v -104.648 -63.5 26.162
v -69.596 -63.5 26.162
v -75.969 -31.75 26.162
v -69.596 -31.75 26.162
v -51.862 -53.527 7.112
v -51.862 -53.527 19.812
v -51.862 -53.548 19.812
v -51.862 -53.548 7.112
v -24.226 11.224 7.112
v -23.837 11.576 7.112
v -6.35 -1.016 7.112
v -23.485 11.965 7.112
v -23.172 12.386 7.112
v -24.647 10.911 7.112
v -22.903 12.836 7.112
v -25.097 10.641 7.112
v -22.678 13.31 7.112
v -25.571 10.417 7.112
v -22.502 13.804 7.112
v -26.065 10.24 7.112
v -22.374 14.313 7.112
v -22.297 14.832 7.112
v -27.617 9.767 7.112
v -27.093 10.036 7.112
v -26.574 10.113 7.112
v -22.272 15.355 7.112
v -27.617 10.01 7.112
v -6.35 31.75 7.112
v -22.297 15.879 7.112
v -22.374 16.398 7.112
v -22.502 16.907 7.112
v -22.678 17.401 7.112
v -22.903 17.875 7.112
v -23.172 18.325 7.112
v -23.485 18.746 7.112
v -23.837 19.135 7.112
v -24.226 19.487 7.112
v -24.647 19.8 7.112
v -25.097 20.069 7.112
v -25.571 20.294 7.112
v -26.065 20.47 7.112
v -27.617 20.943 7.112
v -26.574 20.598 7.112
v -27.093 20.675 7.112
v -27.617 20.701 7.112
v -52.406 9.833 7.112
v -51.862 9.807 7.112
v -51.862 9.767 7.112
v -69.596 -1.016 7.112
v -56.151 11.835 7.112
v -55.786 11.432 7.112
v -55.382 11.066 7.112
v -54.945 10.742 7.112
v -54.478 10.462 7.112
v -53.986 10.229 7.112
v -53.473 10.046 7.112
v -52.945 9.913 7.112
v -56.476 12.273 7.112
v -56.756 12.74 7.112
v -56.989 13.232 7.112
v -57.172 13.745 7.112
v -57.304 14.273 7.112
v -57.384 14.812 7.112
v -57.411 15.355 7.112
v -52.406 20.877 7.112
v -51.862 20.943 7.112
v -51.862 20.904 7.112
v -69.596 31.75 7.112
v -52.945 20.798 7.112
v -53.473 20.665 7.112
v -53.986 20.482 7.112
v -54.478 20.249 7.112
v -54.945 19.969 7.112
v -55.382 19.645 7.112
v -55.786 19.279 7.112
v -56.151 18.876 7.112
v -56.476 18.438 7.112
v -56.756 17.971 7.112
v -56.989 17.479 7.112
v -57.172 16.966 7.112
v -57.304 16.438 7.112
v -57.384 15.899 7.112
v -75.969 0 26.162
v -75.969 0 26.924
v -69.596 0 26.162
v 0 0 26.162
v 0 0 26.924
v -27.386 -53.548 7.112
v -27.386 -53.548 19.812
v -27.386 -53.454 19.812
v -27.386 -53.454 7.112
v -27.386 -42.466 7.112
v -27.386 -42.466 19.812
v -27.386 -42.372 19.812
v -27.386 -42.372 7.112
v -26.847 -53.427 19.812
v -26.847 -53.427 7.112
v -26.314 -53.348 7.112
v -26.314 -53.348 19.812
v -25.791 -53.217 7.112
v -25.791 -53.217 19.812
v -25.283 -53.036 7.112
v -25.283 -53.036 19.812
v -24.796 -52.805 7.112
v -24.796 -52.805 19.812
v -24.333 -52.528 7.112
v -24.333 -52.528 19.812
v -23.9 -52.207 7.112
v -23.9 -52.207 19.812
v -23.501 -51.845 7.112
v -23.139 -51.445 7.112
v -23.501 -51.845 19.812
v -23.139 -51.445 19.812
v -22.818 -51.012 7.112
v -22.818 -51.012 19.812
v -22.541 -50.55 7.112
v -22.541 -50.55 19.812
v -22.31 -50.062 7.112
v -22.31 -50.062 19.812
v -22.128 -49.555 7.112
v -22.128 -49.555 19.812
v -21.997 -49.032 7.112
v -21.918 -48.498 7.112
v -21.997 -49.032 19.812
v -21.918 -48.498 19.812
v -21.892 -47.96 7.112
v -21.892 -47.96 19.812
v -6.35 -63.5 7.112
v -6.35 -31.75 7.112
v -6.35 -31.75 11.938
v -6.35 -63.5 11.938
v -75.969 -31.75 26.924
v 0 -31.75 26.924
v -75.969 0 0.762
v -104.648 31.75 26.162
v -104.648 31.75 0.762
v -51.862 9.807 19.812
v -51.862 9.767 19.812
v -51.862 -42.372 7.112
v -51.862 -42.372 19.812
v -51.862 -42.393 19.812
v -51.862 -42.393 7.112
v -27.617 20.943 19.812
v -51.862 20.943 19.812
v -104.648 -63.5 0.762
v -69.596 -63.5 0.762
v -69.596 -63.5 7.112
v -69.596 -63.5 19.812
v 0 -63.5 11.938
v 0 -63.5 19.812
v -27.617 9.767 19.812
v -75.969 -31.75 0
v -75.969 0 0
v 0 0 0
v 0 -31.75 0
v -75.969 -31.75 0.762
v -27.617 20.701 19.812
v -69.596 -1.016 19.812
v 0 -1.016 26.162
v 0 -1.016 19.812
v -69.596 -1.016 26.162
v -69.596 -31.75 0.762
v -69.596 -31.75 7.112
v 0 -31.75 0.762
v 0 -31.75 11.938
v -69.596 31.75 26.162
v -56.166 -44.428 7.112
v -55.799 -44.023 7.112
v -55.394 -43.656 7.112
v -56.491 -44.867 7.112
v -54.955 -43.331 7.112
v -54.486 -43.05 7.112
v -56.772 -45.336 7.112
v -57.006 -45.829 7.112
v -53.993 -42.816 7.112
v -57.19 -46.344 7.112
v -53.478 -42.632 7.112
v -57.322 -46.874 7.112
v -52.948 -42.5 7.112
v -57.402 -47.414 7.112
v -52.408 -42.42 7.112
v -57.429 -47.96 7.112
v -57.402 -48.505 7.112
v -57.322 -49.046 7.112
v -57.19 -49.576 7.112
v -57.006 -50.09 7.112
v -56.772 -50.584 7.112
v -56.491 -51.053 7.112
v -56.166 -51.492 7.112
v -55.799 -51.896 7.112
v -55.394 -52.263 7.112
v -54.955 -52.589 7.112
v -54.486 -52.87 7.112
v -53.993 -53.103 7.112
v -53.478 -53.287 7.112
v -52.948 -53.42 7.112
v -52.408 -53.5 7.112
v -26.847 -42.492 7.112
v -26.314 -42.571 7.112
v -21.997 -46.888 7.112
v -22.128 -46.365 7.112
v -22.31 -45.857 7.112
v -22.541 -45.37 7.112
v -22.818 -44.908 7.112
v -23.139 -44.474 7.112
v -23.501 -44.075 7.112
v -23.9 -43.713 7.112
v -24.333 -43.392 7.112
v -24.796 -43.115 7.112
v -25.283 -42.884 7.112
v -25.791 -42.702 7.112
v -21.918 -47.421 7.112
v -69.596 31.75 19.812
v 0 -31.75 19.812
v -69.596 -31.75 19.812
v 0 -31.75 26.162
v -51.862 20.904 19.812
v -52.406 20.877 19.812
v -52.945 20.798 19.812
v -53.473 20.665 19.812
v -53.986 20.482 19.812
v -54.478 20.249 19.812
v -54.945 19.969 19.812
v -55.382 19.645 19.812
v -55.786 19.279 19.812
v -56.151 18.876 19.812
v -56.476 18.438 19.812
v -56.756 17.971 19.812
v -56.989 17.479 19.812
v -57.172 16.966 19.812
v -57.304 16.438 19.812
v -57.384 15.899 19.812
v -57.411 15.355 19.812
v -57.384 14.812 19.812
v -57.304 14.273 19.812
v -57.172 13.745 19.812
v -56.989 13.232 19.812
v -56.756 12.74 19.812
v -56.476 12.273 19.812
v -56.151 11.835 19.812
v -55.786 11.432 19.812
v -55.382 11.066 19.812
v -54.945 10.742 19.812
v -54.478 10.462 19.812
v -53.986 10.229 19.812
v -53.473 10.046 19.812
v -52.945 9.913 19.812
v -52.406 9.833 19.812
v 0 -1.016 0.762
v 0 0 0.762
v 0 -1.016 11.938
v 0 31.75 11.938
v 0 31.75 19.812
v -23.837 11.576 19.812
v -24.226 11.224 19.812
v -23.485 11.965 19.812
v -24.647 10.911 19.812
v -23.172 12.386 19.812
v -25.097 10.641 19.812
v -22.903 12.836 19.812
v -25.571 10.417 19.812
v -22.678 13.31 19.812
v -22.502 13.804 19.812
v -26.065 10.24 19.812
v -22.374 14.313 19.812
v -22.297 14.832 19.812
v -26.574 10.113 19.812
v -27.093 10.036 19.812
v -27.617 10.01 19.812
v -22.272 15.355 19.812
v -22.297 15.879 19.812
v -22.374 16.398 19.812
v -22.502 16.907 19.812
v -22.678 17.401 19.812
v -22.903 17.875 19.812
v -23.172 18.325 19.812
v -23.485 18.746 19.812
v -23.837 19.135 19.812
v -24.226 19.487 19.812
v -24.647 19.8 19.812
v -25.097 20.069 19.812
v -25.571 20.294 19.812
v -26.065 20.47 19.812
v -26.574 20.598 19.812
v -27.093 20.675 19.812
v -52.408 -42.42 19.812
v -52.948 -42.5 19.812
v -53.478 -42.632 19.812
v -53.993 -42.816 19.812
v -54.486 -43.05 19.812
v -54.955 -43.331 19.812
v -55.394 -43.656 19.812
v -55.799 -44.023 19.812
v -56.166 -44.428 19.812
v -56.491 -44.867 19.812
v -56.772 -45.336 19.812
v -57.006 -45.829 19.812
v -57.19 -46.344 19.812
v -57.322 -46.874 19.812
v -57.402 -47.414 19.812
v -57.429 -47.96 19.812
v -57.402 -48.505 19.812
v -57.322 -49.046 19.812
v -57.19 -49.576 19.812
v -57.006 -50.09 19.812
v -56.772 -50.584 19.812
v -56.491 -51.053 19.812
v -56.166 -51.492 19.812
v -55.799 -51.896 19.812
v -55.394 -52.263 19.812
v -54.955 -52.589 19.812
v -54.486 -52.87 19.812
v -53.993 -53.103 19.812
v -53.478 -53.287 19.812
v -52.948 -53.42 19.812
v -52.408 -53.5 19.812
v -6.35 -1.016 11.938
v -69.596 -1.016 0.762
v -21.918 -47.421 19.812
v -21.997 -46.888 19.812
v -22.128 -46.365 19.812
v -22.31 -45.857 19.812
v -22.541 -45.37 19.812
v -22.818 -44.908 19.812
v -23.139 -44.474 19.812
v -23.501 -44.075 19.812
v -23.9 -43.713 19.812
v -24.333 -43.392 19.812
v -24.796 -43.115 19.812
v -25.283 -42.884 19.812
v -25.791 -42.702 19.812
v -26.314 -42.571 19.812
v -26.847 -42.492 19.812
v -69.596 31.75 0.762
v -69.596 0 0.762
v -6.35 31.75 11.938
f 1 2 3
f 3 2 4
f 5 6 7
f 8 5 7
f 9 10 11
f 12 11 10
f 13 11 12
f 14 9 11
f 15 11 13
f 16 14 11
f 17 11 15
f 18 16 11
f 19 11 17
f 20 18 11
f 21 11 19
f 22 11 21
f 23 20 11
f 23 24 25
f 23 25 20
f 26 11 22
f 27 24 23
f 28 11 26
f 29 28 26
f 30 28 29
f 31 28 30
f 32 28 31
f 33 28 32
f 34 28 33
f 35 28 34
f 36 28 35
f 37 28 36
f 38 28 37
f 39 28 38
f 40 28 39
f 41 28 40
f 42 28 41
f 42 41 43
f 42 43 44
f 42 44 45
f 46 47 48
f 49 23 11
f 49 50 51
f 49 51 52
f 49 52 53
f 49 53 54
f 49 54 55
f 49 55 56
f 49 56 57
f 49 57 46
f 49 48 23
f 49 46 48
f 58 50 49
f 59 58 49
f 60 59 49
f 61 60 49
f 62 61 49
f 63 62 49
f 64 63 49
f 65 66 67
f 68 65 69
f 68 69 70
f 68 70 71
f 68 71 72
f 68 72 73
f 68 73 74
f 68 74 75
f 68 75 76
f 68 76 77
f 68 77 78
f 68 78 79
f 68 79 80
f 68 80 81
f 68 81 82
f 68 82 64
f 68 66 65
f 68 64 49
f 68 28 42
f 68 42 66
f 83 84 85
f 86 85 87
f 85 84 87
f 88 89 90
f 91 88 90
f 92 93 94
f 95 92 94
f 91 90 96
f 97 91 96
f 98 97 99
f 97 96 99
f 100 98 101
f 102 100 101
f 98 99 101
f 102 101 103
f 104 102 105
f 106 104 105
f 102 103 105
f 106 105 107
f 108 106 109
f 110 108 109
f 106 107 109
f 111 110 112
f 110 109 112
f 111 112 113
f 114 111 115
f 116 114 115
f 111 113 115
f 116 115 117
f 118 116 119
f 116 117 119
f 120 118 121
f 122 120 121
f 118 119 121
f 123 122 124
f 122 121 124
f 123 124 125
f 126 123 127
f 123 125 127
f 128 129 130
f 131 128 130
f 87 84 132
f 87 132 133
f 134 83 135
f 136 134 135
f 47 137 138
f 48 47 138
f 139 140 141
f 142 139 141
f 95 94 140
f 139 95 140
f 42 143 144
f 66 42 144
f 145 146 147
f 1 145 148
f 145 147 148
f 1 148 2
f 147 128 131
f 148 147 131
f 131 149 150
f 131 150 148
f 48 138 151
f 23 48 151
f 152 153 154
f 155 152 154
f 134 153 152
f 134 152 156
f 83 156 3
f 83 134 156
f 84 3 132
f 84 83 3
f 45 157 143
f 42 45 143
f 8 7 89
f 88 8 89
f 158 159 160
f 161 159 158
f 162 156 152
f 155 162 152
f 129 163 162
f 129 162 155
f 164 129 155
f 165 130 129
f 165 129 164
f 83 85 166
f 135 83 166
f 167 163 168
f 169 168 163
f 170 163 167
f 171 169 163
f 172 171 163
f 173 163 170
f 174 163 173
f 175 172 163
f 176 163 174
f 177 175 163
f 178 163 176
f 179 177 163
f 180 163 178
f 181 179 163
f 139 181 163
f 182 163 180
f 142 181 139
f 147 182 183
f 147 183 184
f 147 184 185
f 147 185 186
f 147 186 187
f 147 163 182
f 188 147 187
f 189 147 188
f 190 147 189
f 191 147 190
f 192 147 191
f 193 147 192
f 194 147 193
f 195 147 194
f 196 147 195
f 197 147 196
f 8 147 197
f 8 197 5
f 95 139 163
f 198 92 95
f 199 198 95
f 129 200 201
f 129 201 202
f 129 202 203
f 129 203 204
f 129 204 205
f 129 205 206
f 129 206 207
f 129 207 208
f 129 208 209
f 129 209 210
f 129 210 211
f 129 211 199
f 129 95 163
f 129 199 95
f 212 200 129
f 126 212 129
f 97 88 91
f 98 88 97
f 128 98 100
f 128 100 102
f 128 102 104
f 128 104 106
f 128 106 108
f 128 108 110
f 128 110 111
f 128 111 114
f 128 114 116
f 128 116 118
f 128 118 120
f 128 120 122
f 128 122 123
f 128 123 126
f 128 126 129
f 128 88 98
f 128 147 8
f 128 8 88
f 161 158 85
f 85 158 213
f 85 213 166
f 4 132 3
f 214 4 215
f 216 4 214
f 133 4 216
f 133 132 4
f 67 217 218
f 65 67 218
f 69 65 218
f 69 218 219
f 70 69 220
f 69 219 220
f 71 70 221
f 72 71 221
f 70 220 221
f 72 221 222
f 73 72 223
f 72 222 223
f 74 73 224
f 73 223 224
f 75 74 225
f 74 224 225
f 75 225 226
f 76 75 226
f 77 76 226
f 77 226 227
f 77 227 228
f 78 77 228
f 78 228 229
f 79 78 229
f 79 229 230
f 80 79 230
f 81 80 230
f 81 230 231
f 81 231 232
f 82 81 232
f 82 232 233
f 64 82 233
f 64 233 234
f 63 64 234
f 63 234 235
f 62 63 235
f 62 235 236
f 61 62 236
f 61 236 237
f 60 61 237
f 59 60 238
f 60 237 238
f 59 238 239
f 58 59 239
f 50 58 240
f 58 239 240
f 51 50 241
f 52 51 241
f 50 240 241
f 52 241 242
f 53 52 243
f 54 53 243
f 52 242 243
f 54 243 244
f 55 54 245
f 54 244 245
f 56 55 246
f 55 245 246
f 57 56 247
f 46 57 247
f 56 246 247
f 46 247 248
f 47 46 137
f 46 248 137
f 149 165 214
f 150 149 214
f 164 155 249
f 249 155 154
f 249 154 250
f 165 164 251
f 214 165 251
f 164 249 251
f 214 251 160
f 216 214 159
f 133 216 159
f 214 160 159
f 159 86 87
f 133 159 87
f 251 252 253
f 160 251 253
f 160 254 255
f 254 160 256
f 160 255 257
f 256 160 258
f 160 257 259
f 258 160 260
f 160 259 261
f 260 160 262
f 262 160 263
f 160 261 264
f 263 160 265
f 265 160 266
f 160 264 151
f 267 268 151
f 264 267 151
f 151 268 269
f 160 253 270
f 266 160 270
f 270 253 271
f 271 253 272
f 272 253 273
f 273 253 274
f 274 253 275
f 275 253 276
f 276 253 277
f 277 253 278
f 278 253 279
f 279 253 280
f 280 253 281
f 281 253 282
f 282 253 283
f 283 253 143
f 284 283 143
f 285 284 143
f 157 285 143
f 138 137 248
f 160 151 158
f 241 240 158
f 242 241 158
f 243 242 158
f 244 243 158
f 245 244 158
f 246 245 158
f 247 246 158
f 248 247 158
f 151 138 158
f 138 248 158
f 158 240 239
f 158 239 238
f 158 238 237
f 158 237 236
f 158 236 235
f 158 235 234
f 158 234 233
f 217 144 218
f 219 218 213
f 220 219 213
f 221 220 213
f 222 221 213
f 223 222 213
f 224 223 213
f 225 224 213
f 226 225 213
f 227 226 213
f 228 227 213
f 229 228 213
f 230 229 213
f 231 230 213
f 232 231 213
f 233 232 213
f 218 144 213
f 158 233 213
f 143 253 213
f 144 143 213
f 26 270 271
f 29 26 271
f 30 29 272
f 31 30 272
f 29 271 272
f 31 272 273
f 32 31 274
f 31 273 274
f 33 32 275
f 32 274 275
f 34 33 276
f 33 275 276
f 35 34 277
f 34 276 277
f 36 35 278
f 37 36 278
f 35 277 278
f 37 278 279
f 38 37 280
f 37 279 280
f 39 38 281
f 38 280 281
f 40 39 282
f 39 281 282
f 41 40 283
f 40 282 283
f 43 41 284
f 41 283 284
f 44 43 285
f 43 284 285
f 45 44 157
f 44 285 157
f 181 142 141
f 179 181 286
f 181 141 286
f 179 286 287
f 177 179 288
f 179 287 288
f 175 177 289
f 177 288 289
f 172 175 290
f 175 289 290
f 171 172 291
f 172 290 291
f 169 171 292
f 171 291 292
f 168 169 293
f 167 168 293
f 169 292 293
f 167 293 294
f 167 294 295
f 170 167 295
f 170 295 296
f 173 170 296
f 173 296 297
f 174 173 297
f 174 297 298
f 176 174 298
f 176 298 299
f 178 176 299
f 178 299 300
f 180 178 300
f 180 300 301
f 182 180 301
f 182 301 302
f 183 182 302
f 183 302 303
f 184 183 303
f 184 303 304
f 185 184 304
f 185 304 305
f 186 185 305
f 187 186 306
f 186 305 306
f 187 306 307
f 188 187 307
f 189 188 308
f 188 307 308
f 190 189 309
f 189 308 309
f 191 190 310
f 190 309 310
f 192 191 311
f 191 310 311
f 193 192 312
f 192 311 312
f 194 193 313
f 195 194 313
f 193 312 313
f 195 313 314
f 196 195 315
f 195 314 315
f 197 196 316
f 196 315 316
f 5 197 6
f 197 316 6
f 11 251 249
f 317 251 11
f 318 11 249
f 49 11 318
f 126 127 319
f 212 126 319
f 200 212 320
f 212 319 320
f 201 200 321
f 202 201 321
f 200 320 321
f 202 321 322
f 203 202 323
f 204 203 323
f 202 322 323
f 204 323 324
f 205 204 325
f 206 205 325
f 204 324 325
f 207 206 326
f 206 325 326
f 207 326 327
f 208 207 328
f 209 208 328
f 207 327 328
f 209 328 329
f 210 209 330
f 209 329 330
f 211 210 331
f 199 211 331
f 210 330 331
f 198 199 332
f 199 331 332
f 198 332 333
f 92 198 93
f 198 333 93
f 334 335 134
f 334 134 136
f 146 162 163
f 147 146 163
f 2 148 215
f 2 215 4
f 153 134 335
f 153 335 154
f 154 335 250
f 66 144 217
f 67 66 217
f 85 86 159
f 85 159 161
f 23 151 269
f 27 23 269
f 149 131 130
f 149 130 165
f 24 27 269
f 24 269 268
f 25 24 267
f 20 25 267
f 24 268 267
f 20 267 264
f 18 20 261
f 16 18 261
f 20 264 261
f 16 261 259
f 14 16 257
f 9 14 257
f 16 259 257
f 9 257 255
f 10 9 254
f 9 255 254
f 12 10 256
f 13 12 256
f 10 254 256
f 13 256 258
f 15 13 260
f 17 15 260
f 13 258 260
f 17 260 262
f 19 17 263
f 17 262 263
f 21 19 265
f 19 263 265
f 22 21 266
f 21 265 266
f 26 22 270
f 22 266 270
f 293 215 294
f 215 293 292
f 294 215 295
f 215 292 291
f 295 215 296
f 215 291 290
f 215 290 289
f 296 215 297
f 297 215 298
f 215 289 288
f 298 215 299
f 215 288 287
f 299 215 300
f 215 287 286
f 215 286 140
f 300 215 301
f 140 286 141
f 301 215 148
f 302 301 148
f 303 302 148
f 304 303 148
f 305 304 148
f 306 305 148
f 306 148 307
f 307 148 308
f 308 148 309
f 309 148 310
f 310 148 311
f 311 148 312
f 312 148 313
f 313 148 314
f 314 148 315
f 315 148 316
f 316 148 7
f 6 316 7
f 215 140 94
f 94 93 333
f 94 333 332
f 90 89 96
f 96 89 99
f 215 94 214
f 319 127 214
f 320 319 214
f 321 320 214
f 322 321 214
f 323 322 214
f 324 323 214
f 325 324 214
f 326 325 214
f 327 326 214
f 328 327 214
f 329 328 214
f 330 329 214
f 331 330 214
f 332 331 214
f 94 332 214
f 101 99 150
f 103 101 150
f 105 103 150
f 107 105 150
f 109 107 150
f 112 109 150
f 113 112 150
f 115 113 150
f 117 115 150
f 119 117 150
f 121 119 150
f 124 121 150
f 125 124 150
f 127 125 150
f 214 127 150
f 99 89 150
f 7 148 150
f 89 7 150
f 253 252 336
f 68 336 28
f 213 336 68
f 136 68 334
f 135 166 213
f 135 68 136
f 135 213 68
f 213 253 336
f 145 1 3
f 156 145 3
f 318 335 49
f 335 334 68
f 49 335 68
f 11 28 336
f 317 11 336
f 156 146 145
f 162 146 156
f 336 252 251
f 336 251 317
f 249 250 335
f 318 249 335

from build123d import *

# Parameters (mm, degrees)
F0_W      = 75.9690925479
F0_H      = 26.924
F1_DEPTH  = 31.75
F2_W      = 31.75
F2_H      = 25.4
F3_DEPTH  = 104.648
F4_W      = 69.596
F4_H      = 6.35
F5_DEPTH  = 32.766
F6_W      = 6.35
F6_H      = 4.826
F7_DEPTH  = 31.75
F8_DEPTH  = 31.75
F9_DEPTH  = 32.004
F10_DEPTH = 32.766
F11_DEPTH = 32.766
F12_W     = 69.596
F12_H     = 6.35
F13_DEPTH = 31.75
F14_W     = 6.35
F14_H     = 4.826
F15_DEPTH = 31.75
F17_DEPTH = 19.813
F19_DEPTH = 19.813
F21_DEPTH = 26.163
F23_DEPTH = 26.163


with BuildPart() as f1:
    # F0 (on Front) → F1 (new body)
    with BuildSketch(Plane.XZ):
        with Locations((-37.9845462739, 13.462)):
            Rectangle(F0_W, F0_H)
    extrude(amount=F1_DEPTH)

    # F2 (on face) → F3 (join)
    with BuildSketch(Plane.YZ):
        with Locations((-47.625, 13.462)):
            Rectangle(F2_W, F2_H)
        with Locations((15.875, 13.462)):
            Rectangle(F2_W, F2_H)
    extrude(amount=-F3_DEPTH)

    # F4 (on face) → F5 (cut)
    with BuildSketch(Plane(origin=(0, 31.75, 0), x_dir=(-1, 0, 0), z_dir=(0, 1, 0))):
        with Locations((34.798, 22.987)):
            Rectangle(F4_W, F4_H)
        with Locations((34.798, 3.937)):
            Rectangle(F4_W, F4_H)
    extrude(amount=-F5_DEPTH, mode=Mode.SUBTRACT)

    # F6 (on face) → F7 (join)
    with BuildSketch(Plane(origin=(0, 31.75, 0), x_dir=(-1, 0, 0), z_dir=(0, 1, 0))):
        with Locations((3.175, 9.525)):
            Rectangle(F6_W, F6_H)
    extrude(amount=-F7_DEPTH)

    # F6 (on face) → F8 (join)
    with BuildSketch(Plane(origin=(0, 31.75, 0), x_dir=(-1, 0, 0), z_dir=(0, 1, 0))):
        with Locations((3.175, 9.525)):
            Rectangle(F6_W, F6_H)
    extrude(amount=-F8_DEPTH)

    # F6 (on face) → F9 (cut)
    with BuildSketch(Plane(origin=(0, 31.75, 0), x_dir=(-1, 0, 0), z_dir=(0, 1, 0))):
        with Locations((3.175, 9.525)):
            Rectangle(F6_W, F6_H)
    extrude(amount=-F9_DEPTH, mode=Mode.SUBTRACT)

    # F6 (on face) → F10 (join)
    with BuildSketch(Plane(origin=(0, 31.75, 0), x_dir=(-1, 0, 0), z_dir=(0, 1, 0))):
        with Locations((3.175, 9.525)):
            Rectangle(F6_W, F6_H)
    extrude(amount=-F10_DEPTH)

    # F6 (on face) → F11 (cut)
    with BuildSketch(Plane(origin=(0, 31.75, 0), x_dir=(-1, 0, 0), z_dir=(0, 1, 0))):
        with Locations((3.175, 9.525)):
            Rectangle(F6_W, F6_H)
    extrude(amount=-F11_DEPTH, mode=Mode.SUBTRACT)

    # F12 (on face) → F13 (cut)
    with BuildSketch(Plane.XZ.offset(63.5)):
        with Locations((-34.798, 3.937)):
            Rectangle(F12_W, F12_H)
        with Locations((-34.798, 22.987)):
            Rectangle(F12_W, F12_H)
    extrude(amount=-F13_DEPTH, mode=Mode.SUBTRACT)

    # F14 (on face) → F15 (cut)
    with BuildSketch(Plane.XZ.offset(63.5)):
        with Locations((-3.175, 9.525)):
            Rectangle(F14_W, F14_H)
    extrude(amount=-F15_DEPTH, mode=Mode.SUBTRACT)

    # F16 (on face) → F17 (cut, through all)
    with BuildSketch(Plane.XY.offset(19.812)):
        with BuildLine():
            Line((-51.8621839583, 20.9041976536), (-51.8621839583, 9.8067118621))
            ThreePointArc((-51.8621839583, 9.8067118621), (-47.9386302296, 11.4319010292), (-46.3134410625, 15.3554547578))
            ThreePointArc((-46.3134410625, 15.3554547578), (-47.9386302296, 19.2790084865), (-51.8621839583, 20.9041976536))
        make_face()
        with BuildLine():
            ThreePointArc((-51.8621839583, 20.9041976536), (-57.410926854, 15.3554547578), (-51.8621839583, 9.8067118621))
            Line((-51.8621839583, 9.8067118621), (-51.8621839583, 20.9041976536))
        make_face()
        with BuildLine():
            Line((-51.8621839583, 9.7674547578), (-27.6167299598, 9.7674547578))
            Line((-27.6167299598, 9.7674547578), (-27.6167299598, 10.0103156582))
            ThreePointArc((-27.6167299598, 10.0103156582), (-32.9618690595, 15.3554547578), (-27.6167299598, 20.7005938574))
            Line((-27.6167299598, 20.7005938574), (-27.6167299598, 20.9434547578))
            Line((-27.6167299598, 20.9434547578), (-51.8621839583, 20.9434547578))
            Line((-51.8621839583, 20.9434547578), (-51.8621839583, 20.9041976536))
            ThreePointArc((-51.8621839583, 20.9041976536), (-47.9386302296, 19.2790084865), (-46.3134410625, 15.3554547578))
            ThreePointArc((-46.3134410625, 15.3554547578), (-47.9386302296, 11.4319010292), (-51.8621839583, 9.8067118621))
            Line((-51.8621839583, 9.8067118621), (-51.8621839583, 9.7674547578))
        make_face()
        with BuildLine():
            ThreePointArc((-27.6167299598, 20.7005938574), (-32.9618690595, 15.3554547578), (-27.6167299598, 10.0103156582))
            Line((-27.6167299598, 10.0103156582), (-27.6167299598, 20.7005938574))
        make_face()
        with BuildLine():
            Line((-27.6167299598, 20.7005938574), (-27.6167299598, 10.0103156582))
            ThreePointArc((-27.6167299598, 10.0103156582), (-23.8371458561, 11.5758706541), (-22.2715908602, 15.3554547578))
            ThreePointArc((-22.2715908602, 15.3554547578), (-23.8371458561, 19.1350388615), (-27.6167299598, 20.7005938574))
        make_face()
    extrude(amount=-F17_DEPTH, mode=Mode.SUBTRACT)

    # F18 (on face) → F19 (cut, through all)
    with BuildSketch(Plane.XY.offset(19.812)):
        with BuildLine():
            Line((-51.8621839583, -53.5478262464), (-27.3858178407, -53.5478262464))
            Line((-27.3858178407, -53.5478262464), (-27.3858178407, -53.4538679724))
            ThreePointArc((-27.3858178407, -53.4538679724), (-32.8798595667, -47.9598262464), (-27.3858178407, -42.4657845204))
            Line((-27.3858178407, -42.4657845204), (-27.3858178407, -42.3718262464))
            Line((-27.3858178407, -42.3718262464), (-51.8621839583, -42.3718262464))
            Line((-51.8621839583, -42.3718262464), (-51.8621839583, -42.3927269235))
            ThreePointArc((-51.8621839583, -42.3927269235), (-47.9256502755, -44.0232925636), (-46.2950846354, -47.9598262464))
            ThreePointArc((-46.2950846354, -47.9598262464), (-47.9256502755, -51.8963599291), (-51.8621839583, -53.5269255693))
            Line((-51.8621839583, -53.5269255693), (-51.8621839583, -53.5478262464))
        make_face()
        with BuildLine():
            ThreePointArc((-27.3858178407, -42.4657845204), (-32.8798595667, -47.9598262464), (-27.3858178407, -53.4538679724))
            Line((-27.3858178407, -53.4538679724), (-27.3858178407, -42.4657845204))
        make_face()
        with BuildLine():
            Line((-27.3858178407, -42.4657845204), (-27.3858178407, -53.4538679724))
            ThreePointArc((-27.3858178407, -53.4538679724), (-23.5009436801, -51.844700407), (-21.8917761147, -47.9598262464))
            ThreePointArc((-21.8917761147, -47.9598262464), (-23.5009436801, -44.0749520858), (-27.3858178407, -42.4657845204))
        make_face()
        with BuildLine():
            ThreePointArc((-51.8621839583, -42.3927269235), (-57.4292832812, -47.9598262464), (-51.8621839583, -53.5269255693))
            Line((-51.8621839583, -53.5269255693), (-51.8621839583, -42.3927269235))
        make_face()
        with BuildLine():
            Line((-51.8621839583, -42.3927269235), (-51.8621839583, -53.5269255693))
            ThreePointArc((-51.8621839583, -53.5269255693), (-47.9256502755, -51.8963599291), (-46.2950846354, -47.9598262464))
            ThreePointArc((-46.2950846354, -47.9598262464), (-47.9256502755, -44.0232925636), (-51.8621839583, -42.3927269235))
        make_face()
    extrude(amount=-F19_DEPTH, mode=Mode.SUBTRACT)

    # F20 (on face) → F21 (cut, through all)
    with BuildSketch(Plane.XY.offset(26.162)):
        Polygon((-104.648, -31.75), (-104.648, -63.5), (-75.9690925479, -31.75), align=None)
    extrude(amount=-F21_DEPTH, mode=Mode.SUBTRACT)

    # F22 (on face) → F23 (cut, through all)
    with BuildSketch(Plane.XY.offset(26.162)):
        Polygon((-104.648, 0), (-75.9690925479, 0), (-104.648, 31.75), align=None)
    extrude(amount=-F23_DEPTH, mode=Mode.SUBTRACT)


solid = f1.part
